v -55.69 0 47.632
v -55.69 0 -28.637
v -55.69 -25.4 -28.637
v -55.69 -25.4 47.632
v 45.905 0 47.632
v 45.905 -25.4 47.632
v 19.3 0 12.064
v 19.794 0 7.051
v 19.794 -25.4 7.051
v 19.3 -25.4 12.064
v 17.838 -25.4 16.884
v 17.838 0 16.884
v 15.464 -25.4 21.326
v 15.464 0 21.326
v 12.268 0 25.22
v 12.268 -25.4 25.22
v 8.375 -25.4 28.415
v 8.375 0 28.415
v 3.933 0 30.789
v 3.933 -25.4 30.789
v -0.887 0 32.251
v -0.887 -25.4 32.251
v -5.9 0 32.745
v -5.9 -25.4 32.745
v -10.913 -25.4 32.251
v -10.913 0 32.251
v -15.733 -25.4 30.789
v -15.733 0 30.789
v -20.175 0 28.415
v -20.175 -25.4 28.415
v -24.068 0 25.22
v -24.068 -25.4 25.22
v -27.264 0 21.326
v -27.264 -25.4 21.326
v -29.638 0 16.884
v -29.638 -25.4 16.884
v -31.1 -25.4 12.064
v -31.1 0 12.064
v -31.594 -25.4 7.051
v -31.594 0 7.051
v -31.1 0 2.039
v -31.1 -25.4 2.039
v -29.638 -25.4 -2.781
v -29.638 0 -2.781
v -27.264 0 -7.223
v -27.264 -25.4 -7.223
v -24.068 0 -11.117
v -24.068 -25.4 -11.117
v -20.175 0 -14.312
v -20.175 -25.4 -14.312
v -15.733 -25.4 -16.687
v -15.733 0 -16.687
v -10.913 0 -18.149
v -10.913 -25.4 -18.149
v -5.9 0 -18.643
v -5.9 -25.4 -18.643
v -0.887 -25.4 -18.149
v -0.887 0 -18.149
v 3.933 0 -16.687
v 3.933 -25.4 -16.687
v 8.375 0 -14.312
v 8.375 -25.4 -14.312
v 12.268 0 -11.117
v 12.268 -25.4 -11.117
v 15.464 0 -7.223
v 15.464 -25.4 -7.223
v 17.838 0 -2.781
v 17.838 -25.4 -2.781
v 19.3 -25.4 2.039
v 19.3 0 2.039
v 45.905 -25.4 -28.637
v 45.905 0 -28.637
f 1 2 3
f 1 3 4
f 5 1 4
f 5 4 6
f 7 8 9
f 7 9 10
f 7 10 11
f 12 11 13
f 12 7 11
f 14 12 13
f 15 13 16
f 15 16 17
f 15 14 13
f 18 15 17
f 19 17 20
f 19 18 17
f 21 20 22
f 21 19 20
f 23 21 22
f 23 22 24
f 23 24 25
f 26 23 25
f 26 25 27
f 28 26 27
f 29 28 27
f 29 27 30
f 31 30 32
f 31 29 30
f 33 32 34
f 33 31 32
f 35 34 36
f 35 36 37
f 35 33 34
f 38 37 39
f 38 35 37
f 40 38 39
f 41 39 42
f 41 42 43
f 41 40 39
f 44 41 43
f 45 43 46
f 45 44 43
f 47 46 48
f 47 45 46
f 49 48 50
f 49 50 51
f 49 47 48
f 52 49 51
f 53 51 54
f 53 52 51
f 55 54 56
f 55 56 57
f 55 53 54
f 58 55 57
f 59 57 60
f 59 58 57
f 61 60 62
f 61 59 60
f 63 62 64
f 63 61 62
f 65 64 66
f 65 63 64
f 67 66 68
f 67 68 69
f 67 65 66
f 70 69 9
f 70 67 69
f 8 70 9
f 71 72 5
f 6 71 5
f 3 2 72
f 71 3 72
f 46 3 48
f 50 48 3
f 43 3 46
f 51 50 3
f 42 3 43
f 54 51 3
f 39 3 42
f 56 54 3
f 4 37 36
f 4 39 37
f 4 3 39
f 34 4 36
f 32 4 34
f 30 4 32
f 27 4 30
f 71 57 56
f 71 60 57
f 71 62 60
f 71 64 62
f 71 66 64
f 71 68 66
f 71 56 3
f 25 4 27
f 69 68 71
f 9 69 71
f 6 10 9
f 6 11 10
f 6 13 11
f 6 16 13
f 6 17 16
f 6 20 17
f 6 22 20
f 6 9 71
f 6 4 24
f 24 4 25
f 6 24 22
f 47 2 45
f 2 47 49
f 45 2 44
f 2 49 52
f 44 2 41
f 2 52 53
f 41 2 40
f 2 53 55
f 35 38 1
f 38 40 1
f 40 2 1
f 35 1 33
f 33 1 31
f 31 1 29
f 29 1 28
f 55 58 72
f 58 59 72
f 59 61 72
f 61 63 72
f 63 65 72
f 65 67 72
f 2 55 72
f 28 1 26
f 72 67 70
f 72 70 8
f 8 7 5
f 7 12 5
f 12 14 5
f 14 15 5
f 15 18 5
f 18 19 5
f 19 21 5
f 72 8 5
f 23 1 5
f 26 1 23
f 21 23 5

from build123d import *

# Parameters (mm, degrees)
F1_W     = 101.595435
F1_H     = 76.268525
F1_R     = 25.693818
F2_DEPTH = 25.4


with BuildPart() as f2:
    # F1 (on face) → F2 (new body)
    with BuildSketch(Plane.XZ):
        with Locations((-4.892697, 9.497589)):
            Rectangle(F1_W, F1_H)
        with Locations((-5.900017, 7.051241)):
            Circle(F1_R, mode=Mode.SUBTRACT)
    extrude(amount=F2_DEPTH)


solid = f2.part
